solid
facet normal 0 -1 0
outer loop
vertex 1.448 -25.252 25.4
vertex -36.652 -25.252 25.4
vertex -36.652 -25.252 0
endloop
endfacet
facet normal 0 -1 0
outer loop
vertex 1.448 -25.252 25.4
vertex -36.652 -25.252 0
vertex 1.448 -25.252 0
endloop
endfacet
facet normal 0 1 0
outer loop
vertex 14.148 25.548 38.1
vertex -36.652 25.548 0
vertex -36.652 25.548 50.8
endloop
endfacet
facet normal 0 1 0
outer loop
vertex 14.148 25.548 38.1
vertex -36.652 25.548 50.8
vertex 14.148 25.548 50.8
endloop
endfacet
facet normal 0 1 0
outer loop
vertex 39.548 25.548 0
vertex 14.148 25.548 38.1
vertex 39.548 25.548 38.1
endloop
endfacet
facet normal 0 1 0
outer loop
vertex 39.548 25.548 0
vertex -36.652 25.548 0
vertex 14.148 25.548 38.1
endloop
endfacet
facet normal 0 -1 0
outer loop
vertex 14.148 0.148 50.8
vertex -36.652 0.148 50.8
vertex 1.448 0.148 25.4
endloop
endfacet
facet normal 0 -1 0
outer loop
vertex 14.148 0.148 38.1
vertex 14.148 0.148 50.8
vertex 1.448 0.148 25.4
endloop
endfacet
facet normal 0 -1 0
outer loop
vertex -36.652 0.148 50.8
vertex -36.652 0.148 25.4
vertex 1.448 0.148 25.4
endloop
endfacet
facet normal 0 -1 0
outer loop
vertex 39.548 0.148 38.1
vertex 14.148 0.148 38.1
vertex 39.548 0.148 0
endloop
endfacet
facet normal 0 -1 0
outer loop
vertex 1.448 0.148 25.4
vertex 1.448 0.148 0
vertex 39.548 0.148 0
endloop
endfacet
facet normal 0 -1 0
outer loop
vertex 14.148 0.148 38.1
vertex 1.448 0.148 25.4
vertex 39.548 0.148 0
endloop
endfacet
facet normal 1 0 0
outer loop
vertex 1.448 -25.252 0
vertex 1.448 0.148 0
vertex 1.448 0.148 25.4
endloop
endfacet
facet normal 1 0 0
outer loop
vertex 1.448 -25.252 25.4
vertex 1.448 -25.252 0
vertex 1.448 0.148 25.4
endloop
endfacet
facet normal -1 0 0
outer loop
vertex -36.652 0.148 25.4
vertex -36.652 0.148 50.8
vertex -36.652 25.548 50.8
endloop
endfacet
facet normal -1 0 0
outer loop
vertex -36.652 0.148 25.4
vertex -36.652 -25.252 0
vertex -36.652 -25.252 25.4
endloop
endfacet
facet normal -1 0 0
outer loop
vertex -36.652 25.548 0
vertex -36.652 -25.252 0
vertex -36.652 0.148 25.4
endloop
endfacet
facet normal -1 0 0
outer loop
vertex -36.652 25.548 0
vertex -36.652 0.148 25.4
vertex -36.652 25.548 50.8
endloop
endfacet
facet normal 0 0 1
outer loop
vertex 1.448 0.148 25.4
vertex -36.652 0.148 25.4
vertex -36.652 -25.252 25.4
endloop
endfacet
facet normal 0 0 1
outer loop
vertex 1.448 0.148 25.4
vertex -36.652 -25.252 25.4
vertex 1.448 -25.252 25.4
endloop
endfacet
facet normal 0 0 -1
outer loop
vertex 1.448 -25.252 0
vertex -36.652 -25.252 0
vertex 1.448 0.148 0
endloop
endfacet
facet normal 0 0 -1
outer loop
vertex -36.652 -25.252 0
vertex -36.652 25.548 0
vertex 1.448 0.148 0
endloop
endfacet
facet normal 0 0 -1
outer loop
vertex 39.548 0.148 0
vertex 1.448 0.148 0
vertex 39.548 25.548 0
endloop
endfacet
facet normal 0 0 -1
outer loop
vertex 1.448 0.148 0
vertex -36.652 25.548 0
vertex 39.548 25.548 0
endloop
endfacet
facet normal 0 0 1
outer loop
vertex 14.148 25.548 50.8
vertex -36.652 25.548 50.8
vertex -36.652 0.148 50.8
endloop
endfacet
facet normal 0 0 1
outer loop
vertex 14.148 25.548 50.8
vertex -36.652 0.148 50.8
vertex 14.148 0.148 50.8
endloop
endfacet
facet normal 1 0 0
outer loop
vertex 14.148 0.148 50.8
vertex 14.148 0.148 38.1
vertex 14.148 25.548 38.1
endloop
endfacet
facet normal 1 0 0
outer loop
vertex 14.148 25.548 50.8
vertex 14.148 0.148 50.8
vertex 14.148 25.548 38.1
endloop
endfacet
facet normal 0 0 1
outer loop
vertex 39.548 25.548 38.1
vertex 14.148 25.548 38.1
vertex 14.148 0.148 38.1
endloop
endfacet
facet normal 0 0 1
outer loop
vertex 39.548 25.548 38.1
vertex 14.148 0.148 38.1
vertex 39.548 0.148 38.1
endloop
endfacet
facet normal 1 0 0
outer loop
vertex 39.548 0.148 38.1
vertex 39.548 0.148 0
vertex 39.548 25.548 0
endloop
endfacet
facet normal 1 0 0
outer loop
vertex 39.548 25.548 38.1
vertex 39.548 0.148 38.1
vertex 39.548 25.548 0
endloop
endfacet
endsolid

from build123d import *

# Parameters (mm, degrees)
F0_W     = 76.2
F0_H     = 25.4
F1_DEPTH = 38.1
F2_W     = 38.1
F2_H     = 25.4
F3_DEPTH = 25.4
F4_W     = 50.8
F4_H     = 25.4
F5_DEPTH = 12.7


with BuildPart() as f1:
    # F0 (on Top) → F1 (new body)
    with BuildSketch(Plane.XY):
        with Locations((1.447711, 12.8482)):
            Rectangle(F0_W, F0_H)
    extrude(amount=F1_DEPTH)

    # F2 (on face) → F3 (join)
    with BuildSketch(Plane.XZ.offset(-0.1482)):
        with Locations((-17.602289, 12.7)):
            Rectangle(F2_W, F2_H)
    extrude(amount=F3_DEPTH)

    # F4 (on face) → F5 (join)
    with BuildSketch(Plane.XY.offset(38.1)):
        with Locations((-11.252289, 12.8482)):
            Rectangle(F4_W, F4_H)
    extrude(amount=F5_DEPTH)


solid = f1.part
